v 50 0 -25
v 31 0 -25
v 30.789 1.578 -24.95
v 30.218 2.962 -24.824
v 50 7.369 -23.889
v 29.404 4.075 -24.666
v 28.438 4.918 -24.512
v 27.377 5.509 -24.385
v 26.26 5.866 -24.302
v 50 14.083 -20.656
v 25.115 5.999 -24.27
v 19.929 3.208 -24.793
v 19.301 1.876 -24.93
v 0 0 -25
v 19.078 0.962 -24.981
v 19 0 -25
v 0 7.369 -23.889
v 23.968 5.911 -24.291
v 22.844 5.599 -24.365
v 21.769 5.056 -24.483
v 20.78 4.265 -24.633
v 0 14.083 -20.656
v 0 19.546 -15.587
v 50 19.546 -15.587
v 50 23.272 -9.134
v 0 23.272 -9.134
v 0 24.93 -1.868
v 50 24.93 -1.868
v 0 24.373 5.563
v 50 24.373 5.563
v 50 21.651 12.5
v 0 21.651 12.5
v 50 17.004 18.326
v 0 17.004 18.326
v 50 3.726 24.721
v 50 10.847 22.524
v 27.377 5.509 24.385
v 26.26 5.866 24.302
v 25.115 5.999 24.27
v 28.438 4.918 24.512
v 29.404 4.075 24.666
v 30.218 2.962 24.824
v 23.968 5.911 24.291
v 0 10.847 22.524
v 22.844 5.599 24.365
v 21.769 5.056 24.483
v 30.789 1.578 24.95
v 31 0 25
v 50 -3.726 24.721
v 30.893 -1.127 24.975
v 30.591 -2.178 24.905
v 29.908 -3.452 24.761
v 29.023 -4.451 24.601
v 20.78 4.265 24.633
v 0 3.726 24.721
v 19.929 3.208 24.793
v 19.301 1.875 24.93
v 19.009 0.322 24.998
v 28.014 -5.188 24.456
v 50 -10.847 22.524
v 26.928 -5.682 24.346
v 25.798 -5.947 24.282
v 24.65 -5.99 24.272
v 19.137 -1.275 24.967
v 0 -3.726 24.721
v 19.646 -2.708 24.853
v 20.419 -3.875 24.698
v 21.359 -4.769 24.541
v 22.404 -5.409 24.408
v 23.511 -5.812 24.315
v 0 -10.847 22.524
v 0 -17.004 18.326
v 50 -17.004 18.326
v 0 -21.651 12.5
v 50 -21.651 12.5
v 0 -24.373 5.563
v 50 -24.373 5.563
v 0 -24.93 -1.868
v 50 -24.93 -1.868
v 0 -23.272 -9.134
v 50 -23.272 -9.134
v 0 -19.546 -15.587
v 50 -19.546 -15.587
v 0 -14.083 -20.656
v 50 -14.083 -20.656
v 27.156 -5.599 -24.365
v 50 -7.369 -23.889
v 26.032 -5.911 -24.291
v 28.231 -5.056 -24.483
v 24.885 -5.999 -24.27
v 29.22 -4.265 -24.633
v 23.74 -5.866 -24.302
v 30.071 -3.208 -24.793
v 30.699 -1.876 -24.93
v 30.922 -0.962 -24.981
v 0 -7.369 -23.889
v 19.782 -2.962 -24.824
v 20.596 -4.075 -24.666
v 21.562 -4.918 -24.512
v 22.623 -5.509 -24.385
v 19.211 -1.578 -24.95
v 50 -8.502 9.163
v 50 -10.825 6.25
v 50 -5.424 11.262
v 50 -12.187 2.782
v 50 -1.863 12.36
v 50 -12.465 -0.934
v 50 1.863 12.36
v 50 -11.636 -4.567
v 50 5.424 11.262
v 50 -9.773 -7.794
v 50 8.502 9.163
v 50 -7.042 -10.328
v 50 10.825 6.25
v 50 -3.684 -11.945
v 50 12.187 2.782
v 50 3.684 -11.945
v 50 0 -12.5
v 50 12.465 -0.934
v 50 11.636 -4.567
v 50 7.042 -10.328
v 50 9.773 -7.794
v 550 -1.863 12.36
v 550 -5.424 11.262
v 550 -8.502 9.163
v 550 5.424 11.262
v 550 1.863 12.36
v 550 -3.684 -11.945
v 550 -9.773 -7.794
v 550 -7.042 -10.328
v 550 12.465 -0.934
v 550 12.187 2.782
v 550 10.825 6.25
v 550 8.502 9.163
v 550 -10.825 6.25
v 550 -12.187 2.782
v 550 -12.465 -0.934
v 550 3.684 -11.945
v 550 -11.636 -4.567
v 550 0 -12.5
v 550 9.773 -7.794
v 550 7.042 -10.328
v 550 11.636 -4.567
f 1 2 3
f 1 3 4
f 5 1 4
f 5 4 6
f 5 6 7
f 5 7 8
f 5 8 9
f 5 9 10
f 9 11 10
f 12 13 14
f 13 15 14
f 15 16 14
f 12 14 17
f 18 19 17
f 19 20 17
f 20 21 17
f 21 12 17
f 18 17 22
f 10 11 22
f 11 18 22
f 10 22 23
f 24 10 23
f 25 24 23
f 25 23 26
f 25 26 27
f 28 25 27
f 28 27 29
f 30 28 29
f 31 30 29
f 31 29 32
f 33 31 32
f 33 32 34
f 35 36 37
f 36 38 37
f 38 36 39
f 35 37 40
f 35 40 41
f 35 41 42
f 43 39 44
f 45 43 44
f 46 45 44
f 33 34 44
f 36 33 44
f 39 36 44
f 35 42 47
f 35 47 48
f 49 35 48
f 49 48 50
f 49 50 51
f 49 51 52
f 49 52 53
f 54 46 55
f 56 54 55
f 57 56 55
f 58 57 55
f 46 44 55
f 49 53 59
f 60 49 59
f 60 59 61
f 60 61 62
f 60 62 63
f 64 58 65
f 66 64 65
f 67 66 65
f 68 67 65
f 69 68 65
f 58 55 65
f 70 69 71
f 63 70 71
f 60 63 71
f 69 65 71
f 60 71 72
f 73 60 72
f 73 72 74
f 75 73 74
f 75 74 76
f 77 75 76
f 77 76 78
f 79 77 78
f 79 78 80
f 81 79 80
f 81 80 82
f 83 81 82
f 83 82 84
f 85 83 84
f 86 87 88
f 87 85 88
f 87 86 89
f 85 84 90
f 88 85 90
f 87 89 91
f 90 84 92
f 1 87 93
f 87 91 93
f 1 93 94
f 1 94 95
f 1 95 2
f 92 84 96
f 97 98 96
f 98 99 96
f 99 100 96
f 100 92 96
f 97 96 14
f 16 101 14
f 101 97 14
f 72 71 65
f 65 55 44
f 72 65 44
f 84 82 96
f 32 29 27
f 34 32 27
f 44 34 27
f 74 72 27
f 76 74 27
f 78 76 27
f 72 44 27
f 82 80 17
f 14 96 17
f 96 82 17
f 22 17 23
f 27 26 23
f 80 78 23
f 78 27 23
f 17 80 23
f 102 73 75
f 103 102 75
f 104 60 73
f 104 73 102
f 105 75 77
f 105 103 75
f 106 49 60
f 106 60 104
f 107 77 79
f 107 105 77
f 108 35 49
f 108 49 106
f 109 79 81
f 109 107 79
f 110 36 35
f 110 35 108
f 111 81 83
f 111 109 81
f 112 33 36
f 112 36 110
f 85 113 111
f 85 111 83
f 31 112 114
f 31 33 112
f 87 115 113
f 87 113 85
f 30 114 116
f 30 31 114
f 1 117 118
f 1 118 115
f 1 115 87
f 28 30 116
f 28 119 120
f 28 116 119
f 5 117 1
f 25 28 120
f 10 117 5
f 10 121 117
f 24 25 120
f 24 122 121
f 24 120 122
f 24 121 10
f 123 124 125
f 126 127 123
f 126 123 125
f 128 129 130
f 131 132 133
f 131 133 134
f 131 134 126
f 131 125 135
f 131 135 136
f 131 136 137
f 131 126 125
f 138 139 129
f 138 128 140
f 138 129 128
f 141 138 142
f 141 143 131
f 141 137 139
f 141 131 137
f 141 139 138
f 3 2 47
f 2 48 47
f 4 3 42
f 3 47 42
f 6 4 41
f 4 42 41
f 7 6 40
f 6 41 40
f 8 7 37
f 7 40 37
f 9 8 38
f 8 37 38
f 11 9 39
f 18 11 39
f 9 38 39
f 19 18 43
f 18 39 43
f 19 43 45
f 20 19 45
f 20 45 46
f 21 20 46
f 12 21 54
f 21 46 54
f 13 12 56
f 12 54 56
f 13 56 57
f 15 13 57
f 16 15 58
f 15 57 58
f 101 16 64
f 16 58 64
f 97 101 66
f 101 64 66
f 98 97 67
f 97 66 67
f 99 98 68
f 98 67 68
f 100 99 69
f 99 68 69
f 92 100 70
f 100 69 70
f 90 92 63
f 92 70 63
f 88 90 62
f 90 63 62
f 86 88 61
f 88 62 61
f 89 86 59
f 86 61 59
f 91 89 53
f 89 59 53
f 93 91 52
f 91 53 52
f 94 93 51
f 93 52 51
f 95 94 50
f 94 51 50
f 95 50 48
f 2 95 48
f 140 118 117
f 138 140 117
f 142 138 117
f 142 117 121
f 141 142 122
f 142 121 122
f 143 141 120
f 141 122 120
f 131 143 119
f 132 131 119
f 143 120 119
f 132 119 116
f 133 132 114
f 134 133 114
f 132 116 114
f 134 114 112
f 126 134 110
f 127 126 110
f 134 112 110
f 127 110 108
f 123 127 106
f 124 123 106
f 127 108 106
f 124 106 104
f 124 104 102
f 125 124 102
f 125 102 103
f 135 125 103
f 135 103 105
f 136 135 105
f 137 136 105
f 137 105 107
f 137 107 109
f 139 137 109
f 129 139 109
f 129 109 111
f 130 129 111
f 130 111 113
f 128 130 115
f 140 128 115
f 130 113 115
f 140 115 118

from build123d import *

# Parameters (mm, degrees)
SKETCH1_R               = 25
BOSS_EXTRUDE1_DEPTH     = 50
SKETCH2_R               = 6
CUT_EXTRUDE1_DEPTH      = 26
CUT_EXTRUDE1_DEPTH_BACK = 60
SKETCH3_R               = 12.5
BOSS_EXTRUDE2_DEPTH     = 500


with BuildPart() as part:
    # Sketch1 → Boss-Extrude1 (new body)
    with BuildSketch(Plane(origin=(0, 0, 0), x_dir=(0, 0, -1), z_dir=(1, 0, 0))):
        Circle(SKETCH1_R)
    extrude(amount=BOSS_EXTRUDE1_DEPTH)

    # Sketch2 → Cut-Extrude1 (cut, two sides)
    with BuildSketch(Plane.XY) as cut_extrude1_sk:
        with Locations((25, 0)):
            Circle(SKETCH2_R)
    extrude(amount=CUT_EXTRUDE1_DEPTH, mode=Mode.SUBTRACT)
    extrude(cut_extrude1_sk.sketch, amount=-CUT_EXTRUDE1_DEPTH_BACK, mode=Mode.SUBTRACT)

    # Sketch3 → Boss-Extrude2 (add)
    with BuildSketch(Plane(origin=(50, 0, 0), x_dir=(0, 0, -1), z_dir=(1, 0, 0))):
        Circle(SKETCH3_R)
    extrude(amount=BOSS_EXTRUDE2_DEPTH)


solid = part.part
